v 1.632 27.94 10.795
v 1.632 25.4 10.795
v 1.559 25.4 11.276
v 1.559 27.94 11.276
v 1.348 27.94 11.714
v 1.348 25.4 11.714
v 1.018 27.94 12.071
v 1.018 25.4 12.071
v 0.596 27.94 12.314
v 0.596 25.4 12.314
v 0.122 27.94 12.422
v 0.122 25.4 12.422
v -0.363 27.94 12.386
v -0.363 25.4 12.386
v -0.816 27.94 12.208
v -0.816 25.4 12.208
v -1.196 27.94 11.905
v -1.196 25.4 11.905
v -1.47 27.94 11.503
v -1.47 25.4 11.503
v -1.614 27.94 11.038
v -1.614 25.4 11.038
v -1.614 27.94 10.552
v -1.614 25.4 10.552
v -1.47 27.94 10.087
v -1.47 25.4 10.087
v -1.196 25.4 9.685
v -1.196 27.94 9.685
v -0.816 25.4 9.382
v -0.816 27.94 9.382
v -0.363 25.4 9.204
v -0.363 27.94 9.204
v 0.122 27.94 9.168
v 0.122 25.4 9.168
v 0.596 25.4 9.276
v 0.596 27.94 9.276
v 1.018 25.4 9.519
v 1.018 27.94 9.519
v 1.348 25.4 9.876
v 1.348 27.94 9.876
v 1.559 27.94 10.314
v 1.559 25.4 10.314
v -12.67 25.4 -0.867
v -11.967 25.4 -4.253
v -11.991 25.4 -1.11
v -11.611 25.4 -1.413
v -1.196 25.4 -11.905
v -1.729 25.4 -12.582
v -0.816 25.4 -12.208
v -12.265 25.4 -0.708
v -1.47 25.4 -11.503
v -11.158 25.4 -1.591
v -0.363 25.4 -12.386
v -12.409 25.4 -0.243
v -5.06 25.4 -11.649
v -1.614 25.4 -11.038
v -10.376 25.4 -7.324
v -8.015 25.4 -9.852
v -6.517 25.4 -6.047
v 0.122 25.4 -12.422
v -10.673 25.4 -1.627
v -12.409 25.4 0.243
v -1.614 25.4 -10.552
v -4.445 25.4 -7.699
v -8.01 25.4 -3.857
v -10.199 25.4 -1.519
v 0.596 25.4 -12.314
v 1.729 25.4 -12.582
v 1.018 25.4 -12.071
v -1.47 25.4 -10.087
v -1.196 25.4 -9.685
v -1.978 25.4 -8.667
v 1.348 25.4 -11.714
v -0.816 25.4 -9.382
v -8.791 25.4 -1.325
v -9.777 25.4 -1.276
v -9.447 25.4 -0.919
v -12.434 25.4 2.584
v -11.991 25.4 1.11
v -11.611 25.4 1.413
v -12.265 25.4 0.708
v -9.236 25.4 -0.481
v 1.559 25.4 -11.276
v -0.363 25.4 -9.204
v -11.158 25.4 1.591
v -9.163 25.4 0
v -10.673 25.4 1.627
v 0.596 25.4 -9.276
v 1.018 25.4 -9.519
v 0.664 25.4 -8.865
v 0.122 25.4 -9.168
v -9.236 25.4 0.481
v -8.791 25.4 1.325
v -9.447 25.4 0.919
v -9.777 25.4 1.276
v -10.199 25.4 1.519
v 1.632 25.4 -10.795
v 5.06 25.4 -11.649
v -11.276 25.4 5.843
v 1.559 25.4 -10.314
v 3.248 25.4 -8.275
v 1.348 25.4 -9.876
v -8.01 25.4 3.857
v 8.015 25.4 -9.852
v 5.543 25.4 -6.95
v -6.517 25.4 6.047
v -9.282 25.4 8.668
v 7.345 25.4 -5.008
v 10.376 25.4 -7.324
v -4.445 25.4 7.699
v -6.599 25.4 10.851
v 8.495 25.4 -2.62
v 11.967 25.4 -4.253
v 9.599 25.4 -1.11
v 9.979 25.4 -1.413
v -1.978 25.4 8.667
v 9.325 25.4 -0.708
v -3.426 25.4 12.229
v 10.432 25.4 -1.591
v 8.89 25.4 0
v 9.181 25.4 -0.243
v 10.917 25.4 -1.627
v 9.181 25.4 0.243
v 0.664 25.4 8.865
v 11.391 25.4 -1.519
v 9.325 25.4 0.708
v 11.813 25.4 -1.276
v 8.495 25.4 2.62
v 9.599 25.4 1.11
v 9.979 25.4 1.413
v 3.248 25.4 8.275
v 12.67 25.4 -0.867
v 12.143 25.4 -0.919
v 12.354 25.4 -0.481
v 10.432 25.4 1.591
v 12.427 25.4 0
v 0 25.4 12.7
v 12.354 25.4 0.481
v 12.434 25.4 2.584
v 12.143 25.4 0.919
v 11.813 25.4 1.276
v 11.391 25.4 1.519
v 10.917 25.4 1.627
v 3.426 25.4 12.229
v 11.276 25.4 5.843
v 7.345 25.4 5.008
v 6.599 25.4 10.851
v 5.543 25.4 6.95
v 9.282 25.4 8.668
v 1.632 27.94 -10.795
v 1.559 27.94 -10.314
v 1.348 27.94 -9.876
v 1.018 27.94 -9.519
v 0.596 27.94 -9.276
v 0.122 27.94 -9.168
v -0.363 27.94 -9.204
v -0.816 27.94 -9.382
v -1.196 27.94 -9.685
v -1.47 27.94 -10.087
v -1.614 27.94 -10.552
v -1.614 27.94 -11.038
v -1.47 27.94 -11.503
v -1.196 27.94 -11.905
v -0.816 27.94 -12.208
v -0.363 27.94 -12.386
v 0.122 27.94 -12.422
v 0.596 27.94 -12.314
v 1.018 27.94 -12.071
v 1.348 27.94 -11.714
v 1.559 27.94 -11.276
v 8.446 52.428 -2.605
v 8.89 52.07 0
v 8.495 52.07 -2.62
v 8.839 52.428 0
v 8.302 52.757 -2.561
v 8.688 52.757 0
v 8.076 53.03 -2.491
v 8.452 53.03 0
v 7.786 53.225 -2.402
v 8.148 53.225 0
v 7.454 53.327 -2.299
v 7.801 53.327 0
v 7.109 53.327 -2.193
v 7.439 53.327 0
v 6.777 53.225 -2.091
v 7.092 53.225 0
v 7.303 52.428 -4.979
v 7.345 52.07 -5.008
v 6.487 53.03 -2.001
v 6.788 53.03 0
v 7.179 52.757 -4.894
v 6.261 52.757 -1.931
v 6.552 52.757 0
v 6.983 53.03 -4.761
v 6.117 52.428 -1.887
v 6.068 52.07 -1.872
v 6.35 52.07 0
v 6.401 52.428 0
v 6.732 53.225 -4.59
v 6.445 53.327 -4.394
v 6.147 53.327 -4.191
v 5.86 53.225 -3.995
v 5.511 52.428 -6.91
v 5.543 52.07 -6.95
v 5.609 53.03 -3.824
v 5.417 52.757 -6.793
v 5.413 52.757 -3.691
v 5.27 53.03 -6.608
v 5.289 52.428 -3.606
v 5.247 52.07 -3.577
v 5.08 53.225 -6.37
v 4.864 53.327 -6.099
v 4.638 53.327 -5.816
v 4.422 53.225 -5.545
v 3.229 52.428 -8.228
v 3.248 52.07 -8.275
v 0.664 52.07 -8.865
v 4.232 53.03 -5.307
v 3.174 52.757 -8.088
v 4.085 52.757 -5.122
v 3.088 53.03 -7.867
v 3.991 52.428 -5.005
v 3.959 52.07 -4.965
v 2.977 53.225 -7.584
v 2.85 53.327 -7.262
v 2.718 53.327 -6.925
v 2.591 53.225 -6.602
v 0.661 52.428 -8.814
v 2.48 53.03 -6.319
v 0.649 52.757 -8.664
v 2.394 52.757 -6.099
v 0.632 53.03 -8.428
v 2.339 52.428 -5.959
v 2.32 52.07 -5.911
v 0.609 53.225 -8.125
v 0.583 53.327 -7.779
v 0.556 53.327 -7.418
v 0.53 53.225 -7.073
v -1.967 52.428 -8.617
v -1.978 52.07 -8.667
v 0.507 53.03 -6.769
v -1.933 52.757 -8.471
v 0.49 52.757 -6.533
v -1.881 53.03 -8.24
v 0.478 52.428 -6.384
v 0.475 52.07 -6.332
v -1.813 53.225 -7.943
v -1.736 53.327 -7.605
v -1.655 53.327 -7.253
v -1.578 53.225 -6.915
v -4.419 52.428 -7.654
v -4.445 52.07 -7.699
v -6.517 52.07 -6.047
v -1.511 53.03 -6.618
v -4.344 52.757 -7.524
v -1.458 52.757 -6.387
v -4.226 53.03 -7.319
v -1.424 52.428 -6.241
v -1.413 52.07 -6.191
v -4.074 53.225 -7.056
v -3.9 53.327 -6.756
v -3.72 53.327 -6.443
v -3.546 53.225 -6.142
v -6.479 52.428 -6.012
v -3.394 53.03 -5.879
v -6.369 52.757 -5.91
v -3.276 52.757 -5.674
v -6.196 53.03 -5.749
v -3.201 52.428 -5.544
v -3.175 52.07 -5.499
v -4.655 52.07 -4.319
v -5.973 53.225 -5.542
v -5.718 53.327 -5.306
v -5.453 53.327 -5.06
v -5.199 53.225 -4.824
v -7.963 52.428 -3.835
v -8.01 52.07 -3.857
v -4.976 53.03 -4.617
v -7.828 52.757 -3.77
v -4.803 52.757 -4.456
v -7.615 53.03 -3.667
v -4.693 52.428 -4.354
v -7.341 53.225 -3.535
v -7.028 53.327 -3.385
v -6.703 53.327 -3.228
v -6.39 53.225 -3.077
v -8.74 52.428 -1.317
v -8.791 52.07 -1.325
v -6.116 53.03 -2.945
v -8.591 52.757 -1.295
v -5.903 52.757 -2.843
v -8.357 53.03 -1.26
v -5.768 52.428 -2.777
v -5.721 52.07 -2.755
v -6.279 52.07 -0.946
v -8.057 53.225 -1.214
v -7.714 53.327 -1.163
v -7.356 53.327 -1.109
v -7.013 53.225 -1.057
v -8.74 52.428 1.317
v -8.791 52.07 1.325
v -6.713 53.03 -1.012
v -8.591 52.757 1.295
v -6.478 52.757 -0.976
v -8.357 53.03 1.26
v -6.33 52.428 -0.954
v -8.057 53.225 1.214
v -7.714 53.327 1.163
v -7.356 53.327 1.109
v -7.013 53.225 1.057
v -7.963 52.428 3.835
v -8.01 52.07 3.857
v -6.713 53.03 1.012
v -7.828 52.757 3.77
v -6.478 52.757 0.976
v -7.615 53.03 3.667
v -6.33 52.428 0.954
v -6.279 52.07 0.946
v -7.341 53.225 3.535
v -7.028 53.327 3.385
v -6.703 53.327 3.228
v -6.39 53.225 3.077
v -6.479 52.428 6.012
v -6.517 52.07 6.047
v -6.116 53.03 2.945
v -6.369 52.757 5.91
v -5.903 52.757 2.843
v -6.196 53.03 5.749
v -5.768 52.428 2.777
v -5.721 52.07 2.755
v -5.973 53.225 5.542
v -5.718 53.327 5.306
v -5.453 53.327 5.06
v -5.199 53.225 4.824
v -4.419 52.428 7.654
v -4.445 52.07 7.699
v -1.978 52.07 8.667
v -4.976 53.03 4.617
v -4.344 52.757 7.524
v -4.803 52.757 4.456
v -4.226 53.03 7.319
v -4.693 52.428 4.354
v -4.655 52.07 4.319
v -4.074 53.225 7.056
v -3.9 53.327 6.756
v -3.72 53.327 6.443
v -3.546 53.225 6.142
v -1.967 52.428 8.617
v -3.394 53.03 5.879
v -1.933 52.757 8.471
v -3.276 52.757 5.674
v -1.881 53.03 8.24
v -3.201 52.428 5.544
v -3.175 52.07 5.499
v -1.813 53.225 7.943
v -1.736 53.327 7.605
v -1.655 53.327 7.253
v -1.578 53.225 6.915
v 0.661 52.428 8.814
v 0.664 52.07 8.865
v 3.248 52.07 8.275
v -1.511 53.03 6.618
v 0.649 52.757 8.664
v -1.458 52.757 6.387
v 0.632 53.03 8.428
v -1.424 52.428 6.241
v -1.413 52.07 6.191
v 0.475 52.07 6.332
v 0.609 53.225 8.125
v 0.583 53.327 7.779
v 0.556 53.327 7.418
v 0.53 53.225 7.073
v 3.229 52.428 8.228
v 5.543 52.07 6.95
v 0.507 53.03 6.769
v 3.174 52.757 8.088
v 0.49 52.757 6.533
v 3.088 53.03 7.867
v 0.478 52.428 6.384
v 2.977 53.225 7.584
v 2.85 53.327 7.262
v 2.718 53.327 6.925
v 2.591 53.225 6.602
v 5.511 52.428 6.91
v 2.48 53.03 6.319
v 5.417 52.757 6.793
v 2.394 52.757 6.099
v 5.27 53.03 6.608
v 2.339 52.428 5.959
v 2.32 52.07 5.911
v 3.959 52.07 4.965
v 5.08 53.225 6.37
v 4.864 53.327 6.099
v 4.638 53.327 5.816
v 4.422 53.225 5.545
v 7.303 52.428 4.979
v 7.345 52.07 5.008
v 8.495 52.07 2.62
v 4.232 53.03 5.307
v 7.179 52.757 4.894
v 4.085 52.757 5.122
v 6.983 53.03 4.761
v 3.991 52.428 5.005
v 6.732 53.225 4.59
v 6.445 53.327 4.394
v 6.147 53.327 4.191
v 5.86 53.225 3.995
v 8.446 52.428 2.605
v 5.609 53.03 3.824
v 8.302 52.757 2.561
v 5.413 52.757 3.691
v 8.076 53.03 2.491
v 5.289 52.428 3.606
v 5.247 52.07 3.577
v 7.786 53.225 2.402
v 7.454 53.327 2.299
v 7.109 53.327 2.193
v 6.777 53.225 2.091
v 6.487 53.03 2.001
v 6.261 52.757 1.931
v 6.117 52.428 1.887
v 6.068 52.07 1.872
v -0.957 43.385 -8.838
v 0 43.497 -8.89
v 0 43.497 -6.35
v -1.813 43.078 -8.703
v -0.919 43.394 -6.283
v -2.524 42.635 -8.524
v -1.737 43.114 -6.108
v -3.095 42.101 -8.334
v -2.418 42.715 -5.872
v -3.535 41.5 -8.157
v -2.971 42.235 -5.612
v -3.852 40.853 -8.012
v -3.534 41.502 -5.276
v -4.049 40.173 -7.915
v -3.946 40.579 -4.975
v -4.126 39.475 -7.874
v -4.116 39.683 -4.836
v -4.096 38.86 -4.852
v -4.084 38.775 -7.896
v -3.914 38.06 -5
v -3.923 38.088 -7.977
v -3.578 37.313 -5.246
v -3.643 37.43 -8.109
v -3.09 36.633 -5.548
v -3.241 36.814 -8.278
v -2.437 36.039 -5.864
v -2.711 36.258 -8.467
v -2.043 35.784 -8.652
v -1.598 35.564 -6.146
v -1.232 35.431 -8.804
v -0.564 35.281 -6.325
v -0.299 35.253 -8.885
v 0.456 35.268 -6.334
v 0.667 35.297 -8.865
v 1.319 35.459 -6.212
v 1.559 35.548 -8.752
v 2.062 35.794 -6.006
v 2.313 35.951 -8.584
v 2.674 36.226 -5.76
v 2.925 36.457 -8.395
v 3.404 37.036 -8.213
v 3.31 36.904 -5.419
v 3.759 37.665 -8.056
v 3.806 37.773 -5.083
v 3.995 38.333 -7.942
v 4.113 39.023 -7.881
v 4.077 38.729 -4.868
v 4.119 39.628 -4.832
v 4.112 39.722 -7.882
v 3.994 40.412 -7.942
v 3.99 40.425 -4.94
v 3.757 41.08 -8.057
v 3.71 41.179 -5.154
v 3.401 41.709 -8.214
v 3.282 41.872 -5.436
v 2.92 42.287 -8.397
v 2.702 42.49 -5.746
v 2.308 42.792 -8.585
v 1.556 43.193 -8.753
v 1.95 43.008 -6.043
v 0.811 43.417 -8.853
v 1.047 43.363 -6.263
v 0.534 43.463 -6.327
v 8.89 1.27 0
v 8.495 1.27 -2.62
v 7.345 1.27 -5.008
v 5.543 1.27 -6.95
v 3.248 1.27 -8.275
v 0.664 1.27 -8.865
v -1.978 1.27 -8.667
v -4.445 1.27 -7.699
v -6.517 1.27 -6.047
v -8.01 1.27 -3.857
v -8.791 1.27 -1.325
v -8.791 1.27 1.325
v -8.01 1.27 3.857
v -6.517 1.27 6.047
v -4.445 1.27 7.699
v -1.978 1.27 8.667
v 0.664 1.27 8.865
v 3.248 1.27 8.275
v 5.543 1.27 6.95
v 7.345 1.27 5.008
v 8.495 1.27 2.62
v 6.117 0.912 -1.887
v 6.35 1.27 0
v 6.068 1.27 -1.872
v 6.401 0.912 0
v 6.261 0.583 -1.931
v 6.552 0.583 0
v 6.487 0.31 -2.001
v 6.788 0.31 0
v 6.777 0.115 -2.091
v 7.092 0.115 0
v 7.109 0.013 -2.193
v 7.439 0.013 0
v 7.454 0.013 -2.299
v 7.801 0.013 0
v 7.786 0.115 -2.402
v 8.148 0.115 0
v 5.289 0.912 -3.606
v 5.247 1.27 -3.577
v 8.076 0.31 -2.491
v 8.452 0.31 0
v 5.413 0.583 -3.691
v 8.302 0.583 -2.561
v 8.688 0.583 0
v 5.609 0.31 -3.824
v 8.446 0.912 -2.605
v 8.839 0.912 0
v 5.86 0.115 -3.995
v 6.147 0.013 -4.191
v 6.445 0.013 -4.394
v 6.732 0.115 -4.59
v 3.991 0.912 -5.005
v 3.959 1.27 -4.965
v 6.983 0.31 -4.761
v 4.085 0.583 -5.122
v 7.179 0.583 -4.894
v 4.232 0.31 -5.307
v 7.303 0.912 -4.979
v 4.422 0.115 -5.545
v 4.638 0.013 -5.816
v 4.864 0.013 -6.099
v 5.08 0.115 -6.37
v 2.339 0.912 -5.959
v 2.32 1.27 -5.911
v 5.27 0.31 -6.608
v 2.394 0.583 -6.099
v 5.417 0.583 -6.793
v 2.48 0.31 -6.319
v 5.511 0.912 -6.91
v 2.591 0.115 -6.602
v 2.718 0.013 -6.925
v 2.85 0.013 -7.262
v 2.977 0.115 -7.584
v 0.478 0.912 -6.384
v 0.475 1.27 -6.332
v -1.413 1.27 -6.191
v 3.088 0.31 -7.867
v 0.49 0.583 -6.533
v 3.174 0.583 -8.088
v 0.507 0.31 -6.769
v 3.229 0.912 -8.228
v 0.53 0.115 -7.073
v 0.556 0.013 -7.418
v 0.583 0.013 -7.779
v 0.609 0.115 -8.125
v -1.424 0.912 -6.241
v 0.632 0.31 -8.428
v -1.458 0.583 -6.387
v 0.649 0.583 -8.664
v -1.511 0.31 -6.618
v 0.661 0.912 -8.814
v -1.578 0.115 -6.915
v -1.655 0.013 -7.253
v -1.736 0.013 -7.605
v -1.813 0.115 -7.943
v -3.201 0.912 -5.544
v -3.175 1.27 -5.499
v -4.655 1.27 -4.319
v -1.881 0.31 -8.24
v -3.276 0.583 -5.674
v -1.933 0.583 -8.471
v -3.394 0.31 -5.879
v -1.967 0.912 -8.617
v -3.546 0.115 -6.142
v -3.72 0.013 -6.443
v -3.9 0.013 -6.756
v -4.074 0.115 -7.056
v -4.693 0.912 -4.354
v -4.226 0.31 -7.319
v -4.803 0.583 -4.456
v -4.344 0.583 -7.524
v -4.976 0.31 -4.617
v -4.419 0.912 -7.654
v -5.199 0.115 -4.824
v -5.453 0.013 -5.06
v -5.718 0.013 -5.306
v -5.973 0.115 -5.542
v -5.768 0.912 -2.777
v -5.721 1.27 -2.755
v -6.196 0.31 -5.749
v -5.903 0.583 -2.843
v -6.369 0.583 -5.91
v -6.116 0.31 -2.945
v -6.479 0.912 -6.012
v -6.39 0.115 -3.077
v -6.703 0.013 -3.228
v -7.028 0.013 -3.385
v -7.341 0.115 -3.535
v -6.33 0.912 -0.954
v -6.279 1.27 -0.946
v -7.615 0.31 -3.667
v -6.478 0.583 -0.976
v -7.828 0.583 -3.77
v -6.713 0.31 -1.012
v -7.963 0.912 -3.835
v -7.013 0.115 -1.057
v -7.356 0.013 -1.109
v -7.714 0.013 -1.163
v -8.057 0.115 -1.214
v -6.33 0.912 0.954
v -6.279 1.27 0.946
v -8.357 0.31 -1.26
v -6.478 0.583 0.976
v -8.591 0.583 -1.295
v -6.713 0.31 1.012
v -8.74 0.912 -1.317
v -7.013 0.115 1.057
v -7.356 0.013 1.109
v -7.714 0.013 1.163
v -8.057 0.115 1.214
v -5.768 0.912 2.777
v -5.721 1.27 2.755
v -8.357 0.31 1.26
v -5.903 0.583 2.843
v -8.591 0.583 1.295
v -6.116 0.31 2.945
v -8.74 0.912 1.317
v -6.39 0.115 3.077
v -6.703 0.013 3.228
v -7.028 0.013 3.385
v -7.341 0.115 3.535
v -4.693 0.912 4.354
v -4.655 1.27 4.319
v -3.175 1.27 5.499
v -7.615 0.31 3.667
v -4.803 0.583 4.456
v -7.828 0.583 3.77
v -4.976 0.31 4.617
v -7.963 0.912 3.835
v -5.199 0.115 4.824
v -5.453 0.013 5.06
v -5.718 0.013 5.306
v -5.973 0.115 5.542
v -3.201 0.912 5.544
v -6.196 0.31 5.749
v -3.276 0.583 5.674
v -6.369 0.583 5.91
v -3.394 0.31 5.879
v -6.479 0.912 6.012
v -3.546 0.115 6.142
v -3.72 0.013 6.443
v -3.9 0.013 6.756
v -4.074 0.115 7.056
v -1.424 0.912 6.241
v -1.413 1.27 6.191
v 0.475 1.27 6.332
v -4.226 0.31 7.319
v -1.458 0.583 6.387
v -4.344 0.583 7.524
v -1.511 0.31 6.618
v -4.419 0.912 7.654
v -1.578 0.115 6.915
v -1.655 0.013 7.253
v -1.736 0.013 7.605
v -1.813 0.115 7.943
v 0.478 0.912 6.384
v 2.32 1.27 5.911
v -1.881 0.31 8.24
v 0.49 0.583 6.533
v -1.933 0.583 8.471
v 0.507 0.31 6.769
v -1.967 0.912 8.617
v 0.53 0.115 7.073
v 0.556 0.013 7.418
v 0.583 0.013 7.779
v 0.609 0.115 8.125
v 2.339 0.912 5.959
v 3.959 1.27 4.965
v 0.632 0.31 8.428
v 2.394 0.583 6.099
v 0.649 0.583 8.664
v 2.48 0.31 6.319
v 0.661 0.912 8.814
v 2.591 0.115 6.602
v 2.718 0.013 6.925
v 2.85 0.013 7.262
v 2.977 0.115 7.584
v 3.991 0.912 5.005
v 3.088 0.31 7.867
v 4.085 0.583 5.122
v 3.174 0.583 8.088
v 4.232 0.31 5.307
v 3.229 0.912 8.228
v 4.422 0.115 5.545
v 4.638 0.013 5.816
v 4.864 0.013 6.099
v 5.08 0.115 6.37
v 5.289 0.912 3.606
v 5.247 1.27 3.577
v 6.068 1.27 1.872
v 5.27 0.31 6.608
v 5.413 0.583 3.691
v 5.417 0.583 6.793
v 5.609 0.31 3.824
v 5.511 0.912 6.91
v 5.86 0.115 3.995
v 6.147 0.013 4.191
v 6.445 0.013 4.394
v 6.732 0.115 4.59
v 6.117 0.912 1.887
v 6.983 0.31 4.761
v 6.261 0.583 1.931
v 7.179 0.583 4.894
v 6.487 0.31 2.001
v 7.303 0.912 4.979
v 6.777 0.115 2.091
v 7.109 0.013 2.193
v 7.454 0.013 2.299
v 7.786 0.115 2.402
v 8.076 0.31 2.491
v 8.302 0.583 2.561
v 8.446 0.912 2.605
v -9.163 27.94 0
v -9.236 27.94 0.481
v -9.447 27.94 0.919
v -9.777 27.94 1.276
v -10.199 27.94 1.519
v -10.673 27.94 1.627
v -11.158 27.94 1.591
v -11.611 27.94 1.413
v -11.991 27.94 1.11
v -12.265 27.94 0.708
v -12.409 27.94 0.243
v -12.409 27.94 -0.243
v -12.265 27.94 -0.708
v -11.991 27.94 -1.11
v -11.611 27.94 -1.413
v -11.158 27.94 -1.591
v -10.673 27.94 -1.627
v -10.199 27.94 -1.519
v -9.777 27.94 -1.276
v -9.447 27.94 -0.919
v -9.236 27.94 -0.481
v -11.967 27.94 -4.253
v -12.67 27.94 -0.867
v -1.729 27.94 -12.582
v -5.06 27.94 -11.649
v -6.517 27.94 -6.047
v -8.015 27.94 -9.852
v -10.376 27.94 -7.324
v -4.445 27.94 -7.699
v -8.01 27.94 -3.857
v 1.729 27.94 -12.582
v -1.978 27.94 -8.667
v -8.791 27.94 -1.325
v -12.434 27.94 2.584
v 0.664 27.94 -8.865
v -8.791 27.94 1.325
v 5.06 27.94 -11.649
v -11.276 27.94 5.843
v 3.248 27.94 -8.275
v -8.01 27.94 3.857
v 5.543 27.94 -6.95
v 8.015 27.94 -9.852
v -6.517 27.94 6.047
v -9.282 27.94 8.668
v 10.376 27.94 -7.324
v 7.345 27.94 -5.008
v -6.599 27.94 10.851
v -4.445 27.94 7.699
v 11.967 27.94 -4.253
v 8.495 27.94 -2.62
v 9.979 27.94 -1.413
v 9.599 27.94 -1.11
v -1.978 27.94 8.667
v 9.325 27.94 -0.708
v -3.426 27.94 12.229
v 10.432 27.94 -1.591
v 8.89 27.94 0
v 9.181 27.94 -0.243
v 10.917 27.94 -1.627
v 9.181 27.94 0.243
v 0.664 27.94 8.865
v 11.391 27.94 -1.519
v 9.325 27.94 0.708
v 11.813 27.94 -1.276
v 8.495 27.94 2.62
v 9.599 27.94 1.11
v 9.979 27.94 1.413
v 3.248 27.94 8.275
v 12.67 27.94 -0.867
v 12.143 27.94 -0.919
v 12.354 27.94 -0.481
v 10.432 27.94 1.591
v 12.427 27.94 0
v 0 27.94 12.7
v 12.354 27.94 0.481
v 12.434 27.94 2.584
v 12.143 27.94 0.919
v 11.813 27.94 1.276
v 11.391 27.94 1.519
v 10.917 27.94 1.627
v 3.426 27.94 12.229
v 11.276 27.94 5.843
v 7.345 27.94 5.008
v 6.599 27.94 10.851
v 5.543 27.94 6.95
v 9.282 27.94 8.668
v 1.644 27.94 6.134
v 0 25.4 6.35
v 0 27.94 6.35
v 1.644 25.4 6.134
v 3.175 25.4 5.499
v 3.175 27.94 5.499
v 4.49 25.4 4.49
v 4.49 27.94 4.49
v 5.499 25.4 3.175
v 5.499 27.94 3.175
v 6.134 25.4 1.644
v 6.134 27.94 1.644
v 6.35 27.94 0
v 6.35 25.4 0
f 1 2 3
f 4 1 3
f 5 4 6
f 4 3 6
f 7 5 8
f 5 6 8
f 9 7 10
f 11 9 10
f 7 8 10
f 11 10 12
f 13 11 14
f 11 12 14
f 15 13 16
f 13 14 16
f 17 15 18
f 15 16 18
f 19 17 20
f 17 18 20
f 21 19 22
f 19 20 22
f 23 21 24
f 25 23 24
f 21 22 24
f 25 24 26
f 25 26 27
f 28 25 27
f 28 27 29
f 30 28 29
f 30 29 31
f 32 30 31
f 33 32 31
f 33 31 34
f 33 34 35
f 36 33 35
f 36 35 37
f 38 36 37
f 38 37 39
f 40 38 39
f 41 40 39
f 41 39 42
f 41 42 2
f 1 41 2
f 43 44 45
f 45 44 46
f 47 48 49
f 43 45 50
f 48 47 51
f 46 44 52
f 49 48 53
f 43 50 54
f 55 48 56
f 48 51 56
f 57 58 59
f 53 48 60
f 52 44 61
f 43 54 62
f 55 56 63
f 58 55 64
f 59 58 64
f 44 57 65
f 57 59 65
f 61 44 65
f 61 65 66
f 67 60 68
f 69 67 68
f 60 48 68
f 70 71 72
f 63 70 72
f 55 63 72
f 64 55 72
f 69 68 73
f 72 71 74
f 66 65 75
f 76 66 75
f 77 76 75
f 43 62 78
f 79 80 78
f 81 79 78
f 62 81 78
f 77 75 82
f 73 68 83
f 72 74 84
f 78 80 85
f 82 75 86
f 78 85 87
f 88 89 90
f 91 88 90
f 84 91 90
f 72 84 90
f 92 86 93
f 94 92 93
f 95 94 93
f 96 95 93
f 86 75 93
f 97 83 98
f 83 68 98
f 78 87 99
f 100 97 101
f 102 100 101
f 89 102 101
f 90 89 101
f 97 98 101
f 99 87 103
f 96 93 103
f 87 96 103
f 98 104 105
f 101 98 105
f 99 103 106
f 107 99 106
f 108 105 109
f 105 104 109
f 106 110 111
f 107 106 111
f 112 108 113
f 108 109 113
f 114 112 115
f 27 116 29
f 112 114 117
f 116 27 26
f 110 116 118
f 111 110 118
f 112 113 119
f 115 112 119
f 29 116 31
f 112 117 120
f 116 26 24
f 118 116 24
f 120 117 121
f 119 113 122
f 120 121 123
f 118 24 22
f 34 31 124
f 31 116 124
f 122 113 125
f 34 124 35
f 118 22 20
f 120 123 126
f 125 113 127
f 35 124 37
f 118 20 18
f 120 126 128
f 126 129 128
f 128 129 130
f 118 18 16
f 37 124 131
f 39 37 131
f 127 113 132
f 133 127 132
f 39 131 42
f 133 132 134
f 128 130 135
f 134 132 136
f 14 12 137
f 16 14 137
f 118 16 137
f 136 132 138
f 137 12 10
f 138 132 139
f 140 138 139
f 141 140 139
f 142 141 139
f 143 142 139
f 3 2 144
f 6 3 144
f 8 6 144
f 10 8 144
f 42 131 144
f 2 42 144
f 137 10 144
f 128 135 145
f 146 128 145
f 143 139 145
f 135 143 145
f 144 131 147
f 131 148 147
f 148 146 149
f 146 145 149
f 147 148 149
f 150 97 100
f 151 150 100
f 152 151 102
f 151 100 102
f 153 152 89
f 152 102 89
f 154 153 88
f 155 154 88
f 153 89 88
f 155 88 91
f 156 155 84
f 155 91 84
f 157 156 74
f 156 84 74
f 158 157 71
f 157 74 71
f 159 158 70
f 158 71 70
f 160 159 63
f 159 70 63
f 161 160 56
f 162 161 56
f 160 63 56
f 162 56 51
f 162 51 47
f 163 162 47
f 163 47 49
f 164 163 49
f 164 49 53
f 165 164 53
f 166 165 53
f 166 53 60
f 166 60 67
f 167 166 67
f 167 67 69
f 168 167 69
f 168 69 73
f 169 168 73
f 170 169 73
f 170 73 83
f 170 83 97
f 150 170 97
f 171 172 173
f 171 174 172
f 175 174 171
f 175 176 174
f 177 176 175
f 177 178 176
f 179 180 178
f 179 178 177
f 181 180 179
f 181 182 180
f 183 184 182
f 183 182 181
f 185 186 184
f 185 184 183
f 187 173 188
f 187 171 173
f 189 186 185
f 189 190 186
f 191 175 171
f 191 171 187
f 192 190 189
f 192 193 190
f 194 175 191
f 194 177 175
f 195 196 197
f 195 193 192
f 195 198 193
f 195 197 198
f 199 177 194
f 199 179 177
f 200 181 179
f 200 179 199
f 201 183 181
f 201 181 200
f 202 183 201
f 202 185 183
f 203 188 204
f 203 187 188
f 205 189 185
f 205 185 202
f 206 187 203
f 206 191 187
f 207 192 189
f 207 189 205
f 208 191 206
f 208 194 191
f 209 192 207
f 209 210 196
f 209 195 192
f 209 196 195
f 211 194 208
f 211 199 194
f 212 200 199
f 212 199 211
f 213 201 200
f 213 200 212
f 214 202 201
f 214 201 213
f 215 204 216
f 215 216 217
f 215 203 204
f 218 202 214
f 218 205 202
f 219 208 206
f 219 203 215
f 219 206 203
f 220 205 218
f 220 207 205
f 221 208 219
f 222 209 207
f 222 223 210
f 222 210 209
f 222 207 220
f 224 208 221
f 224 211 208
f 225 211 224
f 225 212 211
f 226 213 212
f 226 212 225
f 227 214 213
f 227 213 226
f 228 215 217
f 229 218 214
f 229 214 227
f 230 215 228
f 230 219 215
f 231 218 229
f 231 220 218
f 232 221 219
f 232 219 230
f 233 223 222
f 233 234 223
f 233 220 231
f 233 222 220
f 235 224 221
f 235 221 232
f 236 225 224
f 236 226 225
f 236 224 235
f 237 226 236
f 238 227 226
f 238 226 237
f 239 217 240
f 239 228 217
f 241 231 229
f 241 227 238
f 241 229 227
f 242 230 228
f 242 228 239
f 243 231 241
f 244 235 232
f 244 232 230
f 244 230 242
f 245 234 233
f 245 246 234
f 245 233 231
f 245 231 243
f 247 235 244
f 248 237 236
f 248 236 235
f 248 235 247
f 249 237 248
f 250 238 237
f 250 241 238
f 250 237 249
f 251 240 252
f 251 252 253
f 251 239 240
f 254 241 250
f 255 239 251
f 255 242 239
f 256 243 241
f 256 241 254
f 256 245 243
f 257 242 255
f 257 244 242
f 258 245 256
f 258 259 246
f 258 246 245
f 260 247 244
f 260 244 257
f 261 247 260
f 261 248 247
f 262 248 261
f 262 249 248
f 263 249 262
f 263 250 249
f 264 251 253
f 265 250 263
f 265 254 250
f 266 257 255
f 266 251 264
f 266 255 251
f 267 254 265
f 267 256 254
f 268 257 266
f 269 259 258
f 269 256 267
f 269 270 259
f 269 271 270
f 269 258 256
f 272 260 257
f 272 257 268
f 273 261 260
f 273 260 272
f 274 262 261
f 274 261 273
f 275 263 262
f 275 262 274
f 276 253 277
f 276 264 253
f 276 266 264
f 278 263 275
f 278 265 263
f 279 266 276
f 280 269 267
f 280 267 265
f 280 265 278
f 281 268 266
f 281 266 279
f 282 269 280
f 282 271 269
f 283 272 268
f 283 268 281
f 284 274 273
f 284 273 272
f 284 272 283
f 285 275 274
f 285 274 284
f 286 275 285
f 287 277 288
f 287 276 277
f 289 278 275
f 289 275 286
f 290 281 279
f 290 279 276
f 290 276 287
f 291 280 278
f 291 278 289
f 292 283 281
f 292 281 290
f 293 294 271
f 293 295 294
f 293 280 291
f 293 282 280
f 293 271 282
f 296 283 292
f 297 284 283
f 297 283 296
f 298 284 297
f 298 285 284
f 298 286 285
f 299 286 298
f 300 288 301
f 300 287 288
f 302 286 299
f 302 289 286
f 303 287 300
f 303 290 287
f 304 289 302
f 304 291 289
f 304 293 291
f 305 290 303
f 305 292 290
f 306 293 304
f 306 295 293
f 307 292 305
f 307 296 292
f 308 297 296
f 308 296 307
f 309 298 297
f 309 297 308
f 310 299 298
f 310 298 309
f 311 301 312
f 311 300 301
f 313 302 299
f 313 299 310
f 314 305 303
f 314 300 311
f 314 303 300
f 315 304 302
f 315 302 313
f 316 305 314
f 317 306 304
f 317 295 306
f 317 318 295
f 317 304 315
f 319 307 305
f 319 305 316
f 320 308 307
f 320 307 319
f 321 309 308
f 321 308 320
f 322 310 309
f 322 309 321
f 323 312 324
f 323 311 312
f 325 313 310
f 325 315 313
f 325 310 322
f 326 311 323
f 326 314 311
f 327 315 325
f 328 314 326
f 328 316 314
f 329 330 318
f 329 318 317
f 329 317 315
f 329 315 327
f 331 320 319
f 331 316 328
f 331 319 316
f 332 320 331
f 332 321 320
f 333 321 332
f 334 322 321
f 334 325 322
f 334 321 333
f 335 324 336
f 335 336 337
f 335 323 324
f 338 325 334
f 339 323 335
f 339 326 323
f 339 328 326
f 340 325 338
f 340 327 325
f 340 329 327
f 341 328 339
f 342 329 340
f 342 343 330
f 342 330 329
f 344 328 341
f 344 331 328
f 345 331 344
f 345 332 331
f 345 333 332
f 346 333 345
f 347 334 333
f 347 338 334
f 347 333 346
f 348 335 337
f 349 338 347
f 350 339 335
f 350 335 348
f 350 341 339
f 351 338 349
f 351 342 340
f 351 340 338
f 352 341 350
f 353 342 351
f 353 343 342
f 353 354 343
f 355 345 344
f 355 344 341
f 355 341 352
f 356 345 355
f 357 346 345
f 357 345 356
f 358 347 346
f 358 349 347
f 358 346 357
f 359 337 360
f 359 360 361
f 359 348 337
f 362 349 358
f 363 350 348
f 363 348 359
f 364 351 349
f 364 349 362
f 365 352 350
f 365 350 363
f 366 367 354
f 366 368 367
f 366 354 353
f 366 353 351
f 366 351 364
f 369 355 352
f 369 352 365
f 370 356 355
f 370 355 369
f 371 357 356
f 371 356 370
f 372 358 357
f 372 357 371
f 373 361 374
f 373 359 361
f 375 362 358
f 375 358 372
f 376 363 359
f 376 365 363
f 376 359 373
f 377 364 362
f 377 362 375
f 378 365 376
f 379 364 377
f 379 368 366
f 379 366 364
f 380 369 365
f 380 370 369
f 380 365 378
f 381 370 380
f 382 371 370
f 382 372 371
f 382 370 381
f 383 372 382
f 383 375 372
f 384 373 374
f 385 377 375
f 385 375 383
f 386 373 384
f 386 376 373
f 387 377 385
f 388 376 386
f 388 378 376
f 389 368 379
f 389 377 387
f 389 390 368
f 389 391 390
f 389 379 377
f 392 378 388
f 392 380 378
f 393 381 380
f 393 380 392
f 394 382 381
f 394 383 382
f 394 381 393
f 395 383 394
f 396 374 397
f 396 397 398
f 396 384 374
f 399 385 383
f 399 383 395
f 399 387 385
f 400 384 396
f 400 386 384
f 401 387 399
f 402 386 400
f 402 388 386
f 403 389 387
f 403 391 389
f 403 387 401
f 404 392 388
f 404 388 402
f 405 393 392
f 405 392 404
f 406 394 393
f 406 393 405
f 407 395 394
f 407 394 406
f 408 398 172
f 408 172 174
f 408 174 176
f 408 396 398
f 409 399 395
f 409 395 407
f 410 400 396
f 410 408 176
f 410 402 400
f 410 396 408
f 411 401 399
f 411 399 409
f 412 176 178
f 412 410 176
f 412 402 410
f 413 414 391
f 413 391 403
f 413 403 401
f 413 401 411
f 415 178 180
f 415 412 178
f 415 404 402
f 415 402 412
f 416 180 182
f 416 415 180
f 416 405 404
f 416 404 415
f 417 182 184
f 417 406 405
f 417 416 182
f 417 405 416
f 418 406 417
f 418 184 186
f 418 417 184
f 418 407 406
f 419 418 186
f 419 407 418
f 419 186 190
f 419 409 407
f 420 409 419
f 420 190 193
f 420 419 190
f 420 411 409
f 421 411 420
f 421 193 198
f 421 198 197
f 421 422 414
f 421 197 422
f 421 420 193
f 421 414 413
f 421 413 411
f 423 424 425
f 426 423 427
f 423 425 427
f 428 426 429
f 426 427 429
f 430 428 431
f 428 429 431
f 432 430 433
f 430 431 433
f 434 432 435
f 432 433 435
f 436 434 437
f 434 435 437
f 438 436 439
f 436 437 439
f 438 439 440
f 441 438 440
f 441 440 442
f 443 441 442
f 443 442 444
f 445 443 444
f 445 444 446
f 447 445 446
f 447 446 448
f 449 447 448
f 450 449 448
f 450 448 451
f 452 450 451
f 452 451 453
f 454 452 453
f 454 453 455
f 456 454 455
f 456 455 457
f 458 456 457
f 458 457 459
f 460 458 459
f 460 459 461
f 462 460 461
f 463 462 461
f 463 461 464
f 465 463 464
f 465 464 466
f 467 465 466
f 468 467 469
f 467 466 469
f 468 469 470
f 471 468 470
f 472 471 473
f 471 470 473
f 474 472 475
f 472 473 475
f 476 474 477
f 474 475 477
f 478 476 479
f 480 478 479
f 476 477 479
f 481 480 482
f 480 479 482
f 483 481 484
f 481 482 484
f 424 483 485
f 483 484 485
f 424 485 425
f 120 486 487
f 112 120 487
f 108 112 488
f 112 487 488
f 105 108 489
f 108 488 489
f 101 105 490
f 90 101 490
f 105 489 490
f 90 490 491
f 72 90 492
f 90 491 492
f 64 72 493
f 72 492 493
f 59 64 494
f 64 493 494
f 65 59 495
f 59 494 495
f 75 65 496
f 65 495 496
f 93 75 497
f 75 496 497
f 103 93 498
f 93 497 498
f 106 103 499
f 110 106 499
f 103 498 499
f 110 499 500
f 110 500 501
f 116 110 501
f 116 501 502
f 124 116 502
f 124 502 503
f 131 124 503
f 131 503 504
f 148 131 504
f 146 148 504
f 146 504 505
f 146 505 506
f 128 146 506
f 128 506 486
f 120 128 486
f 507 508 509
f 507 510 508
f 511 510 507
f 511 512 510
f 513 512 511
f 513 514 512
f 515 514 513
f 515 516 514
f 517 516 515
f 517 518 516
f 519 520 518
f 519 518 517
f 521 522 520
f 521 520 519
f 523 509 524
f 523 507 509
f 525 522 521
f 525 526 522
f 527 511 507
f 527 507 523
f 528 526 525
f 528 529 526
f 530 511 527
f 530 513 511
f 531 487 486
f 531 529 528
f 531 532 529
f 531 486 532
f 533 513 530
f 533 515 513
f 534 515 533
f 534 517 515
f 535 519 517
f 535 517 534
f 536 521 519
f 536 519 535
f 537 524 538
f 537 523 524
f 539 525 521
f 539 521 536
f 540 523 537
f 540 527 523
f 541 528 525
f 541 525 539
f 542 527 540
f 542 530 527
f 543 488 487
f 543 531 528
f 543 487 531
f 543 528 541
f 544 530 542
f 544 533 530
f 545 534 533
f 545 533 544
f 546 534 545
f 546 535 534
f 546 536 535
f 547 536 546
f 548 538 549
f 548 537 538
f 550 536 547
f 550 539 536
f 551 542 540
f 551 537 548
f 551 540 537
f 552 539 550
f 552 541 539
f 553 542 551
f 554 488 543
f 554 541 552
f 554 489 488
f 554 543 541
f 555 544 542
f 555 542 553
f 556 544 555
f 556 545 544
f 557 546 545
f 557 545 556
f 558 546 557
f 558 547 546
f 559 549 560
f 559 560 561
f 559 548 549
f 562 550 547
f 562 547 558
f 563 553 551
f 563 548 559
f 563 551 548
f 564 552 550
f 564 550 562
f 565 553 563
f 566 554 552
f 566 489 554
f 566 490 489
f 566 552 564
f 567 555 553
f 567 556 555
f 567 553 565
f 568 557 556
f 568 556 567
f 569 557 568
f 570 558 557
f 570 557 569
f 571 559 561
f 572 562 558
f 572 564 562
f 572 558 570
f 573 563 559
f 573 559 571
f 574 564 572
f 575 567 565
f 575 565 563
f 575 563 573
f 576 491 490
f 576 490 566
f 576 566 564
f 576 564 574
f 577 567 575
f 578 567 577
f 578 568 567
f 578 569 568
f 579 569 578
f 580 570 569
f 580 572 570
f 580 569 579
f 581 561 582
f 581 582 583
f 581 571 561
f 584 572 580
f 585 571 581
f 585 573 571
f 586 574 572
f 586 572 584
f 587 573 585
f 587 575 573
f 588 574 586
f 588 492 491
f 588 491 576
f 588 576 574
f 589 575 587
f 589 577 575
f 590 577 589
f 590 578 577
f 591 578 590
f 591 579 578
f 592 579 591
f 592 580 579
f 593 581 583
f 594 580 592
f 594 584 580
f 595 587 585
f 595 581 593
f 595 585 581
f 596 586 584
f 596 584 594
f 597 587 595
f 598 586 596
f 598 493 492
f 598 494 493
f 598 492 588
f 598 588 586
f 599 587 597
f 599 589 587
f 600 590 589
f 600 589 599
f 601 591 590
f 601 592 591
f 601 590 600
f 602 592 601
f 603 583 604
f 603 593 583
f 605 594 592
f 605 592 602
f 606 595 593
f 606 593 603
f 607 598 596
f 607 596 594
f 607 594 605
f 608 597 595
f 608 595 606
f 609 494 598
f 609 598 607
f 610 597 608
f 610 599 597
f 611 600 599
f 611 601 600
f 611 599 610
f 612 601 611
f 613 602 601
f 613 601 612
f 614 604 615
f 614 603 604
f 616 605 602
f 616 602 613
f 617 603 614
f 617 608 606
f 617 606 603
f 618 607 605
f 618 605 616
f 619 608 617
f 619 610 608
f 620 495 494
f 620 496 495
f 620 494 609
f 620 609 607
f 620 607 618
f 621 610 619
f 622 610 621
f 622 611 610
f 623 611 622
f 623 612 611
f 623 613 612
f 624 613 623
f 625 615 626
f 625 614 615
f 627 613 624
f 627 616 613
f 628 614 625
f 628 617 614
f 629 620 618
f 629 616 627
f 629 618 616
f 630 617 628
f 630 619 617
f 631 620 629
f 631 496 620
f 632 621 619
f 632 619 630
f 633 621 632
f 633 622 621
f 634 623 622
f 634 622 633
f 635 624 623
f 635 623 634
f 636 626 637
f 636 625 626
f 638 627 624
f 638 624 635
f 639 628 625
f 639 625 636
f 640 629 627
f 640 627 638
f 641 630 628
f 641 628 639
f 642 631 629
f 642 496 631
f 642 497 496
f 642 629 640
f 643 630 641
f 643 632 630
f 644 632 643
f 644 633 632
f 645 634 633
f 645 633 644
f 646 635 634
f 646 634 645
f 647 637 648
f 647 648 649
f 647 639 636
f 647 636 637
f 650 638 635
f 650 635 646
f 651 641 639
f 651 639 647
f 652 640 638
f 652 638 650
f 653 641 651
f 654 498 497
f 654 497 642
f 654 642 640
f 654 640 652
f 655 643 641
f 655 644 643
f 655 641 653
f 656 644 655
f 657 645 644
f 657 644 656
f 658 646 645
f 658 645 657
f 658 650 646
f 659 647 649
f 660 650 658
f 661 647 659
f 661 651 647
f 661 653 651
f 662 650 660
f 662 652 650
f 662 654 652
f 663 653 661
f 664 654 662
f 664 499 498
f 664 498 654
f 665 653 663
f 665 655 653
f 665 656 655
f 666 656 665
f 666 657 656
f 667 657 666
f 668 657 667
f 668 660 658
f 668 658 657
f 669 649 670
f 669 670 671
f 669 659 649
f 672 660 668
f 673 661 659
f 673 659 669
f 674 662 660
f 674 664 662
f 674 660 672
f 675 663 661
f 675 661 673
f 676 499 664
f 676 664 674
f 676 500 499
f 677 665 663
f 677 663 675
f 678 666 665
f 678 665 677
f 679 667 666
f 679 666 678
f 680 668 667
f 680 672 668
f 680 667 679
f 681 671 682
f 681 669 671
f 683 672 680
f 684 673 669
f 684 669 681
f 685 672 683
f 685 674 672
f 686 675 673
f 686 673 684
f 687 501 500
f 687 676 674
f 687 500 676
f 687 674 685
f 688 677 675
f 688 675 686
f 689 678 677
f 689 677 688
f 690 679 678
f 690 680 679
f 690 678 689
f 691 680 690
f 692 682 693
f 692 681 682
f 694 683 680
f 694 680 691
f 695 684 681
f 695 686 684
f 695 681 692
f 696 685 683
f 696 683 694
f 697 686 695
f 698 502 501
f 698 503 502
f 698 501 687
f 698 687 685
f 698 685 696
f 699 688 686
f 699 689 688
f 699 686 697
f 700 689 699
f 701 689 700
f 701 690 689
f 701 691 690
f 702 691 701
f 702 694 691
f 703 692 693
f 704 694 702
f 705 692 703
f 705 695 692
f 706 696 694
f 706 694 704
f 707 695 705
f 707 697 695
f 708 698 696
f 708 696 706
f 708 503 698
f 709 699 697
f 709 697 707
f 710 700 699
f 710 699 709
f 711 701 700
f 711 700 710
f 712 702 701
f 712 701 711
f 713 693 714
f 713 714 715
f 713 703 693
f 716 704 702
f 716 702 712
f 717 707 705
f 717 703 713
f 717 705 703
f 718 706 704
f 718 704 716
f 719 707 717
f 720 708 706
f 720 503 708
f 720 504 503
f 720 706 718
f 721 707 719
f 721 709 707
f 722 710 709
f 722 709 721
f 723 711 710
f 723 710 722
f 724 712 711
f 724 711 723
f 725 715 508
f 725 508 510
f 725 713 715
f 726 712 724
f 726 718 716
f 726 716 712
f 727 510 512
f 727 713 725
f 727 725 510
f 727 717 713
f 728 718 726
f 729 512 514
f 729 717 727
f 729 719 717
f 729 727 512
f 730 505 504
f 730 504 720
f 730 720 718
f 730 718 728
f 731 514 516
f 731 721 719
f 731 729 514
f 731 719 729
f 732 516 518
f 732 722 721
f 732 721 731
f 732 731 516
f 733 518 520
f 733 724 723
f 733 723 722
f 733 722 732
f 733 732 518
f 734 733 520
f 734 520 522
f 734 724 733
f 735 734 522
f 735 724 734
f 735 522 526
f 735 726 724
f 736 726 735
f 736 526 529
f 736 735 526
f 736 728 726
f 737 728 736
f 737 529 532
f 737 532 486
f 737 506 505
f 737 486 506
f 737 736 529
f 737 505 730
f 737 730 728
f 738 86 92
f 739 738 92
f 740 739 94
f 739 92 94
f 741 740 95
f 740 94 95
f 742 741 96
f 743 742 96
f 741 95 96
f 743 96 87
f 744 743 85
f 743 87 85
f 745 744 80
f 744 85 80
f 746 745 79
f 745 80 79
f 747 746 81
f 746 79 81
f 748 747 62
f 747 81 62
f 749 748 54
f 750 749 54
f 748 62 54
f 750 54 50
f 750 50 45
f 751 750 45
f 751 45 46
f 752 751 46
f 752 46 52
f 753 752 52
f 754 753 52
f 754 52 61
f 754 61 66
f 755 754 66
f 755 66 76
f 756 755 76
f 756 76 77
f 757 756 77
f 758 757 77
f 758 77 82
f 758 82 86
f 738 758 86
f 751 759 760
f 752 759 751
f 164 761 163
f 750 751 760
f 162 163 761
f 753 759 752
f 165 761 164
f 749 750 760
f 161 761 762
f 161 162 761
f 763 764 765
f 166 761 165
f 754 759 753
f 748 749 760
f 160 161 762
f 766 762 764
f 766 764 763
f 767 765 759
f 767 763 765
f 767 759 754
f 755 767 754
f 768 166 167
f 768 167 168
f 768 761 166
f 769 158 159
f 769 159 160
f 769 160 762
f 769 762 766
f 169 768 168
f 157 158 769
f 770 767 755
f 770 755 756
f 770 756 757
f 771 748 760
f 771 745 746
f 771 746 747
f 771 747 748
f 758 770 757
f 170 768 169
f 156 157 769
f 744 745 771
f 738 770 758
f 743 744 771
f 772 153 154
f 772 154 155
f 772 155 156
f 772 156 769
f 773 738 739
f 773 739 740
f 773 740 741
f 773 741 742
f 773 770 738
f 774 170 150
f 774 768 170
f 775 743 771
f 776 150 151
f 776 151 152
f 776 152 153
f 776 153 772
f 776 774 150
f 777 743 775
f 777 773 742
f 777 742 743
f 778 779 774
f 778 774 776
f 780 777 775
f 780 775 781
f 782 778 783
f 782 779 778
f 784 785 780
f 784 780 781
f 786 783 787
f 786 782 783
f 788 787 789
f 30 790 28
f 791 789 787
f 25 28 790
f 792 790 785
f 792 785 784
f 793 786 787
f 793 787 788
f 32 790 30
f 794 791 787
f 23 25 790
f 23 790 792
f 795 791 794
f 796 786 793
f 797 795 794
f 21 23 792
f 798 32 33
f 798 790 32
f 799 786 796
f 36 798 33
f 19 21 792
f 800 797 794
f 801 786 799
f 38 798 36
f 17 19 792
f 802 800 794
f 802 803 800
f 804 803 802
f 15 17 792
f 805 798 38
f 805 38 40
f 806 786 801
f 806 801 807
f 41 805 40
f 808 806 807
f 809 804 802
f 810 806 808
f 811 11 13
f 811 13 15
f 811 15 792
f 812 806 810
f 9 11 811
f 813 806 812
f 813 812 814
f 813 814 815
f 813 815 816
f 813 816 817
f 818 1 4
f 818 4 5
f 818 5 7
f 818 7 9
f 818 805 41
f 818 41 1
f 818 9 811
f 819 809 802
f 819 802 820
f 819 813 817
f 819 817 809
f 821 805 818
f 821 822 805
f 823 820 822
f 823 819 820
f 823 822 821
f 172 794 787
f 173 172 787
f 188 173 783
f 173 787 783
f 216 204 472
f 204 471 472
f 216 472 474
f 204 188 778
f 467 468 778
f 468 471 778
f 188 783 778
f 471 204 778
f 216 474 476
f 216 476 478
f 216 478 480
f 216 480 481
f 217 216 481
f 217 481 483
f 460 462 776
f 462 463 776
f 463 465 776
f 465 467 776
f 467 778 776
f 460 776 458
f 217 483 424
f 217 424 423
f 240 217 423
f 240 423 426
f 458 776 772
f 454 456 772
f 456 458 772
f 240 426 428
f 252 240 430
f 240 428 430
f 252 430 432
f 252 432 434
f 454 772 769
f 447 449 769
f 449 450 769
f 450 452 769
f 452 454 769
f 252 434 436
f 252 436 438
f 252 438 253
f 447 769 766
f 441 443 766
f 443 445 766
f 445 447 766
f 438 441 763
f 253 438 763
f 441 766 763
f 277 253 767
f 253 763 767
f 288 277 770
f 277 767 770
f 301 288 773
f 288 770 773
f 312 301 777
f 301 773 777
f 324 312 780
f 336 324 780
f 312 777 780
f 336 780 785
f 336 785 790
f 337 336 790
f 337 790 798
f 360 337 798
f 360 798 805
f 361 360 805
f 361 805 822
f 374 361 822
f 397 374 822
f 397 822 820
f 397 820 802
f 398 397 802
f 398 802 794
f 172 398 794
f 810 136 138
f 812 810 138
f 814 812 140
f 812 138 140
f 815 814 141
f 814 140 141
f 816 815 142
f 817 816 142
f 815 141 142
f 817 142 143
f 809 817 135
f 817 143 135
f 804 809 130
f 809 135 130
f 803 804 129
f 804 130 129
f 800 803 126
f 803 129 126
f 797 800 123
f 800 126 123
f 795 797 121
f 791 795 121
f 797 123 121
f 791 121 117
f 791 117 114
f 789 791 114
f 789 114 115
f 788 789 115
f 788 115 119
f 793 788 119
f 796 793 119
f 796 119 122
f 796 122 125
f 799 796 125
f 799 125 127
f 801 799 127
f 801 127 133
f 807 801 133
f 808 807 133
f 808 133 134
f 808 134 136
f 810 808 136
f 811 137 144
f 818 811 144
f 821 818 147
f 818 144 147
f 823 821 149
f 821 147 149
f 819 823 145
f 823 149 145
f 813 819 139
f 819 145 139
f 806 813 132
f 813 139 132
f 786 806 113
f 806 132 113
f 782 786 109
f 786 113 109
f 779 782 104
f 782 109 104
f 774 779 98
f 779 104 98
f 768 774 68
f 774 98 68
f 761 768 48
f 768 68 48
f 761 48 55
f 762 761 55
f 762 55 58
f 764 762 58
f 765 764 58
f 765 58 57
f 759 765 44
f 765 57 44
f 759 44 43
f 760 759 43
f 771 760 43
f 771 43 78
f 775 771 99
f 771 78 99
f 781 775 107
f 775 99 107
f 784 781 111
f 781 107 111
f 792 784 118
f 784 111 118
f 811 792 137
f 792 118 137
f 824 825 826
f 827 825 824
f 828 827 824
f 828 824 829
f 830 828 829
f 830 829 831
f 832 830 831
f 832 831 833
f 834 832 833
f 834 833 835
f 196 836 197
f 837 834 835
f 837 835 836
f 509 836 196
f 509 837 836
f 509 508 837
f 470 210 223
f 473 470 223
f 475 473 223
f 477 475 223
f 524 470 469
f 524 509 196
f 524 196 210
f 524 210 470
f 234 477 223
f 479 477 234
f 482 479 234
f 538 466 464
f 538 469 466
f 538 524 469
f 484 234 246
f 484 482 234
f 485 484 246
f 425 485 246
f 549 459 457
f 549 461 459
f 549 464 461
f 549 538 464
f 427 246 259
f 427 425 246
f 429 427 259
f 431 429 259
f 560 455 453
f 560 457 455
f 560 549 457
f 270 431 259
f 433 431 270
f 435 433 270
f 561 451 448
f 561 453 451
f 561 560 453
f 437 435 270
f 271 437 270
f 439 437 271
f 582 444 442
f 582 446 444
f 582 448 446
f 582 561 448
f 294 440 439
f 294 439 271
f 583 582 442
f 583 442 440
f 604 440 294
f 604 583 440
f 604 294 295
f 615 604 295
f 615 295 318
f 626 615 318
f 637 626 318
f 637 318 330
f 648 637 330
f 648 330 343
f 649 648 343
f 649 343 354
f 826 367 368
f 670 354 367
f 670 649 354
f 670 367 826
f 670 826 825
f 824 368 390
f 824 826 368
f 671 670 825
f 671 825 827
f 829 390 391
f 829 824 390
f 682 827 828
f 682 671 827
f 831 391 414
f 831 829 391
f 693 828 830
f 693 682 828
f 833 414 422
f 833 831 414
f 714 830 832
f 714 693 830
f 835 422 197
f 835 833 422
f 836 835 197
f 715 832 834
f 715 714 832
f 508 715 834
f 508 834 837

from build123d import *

# Parameters (mm, degrees)
SKETCH1_R                 = 8.89
SKETCH1_R_2               = 6.35
EXTRUDE_THIN1_DEPTH       = 25.4
SKETCH2_R                 = 12.7
SKETCH2_R_2               = 6.35
BOSS_EXTRUDE1_DEPTH       = 2.54
SKETCH3_R                 = 8.89
SKETCH3_R_2               = 6.35
EXTRUDE_THIN2_DEPTH       = 25.4
SKETCH4_R                 = 4.1275
CUT_EXTRUDE1_DEPTH        = 25.4
F_4_CLEARANCE_HOLE1_D     = 3.2639
F_4_CLEARANCE_HOLE1_DEPTH = 25.4
F_4_CLEARANCE_HOLE1_TIP   = 0.980574487
FILLET2_R                 = 1.27
FILLET3_R                 = 1.27


with BuildPart() as part:
    # Sketch1 → Extrude-Thin1 (new body)
    with BuildSketch(Plane(origin=(0, 0, 0), x_dir=(1, 0, 0), z_dir=(0, 1, 0))):
        Circle(SKETCH1_R)
        Circle(SKETCH1_R_2, mode=Mode.SUBTRACT)
    extrude(amount=EXTRUDE_THIN1_DEPTH)

    # Sketch2 → Boss-Extrude1 (add)
    with BuildSketch(Plane(origin=(0, 25.4, 0), x_dir=(1, 0, 0), z_dir=(0, 1, 0))):
        with Locations(Location((0, 0, 0), (0, 0, 270))):
            Circle(SKETCH2_R)
        with Locations(Location((0, 0, 0), (0, 0, 270))):
            Circle(SKETCH2_R_2, mode=Mode.SUBTRACT)
    extrude(amount=BOSS_EXTRUDE1_DEPTH)

    # Sketch3 → Extrude-Thin2 (add)
    with BuildSketch(Plane(origin=(0, 27.94, 0), x_dir=(1, 0, 0), z_dir=(0, 1, 0))):
        Circle(SKETCH3_R)
        Circle(SKETCH3_R_2, mode=Mode.SUBTRACT)
    extrude(amount=EXTRUDE_THIN2_DEPTH)

    # Sketch4 → Cut-Extrude1 (cut)
    with BuildSketch(Plane.XY):
        with Locations(Location((0, 39.37, 0), (0, 0, 90))):
            Circle(SKETCH4_R)
    extrude(amount=-CUT_EXTRUDE1_DEPTH, mode=Mode.SUBTRACT)

    # #4 Clearance Hole1
    with Locations(Plane(origin=(0, 27.94, 0), x_dir=(-1, 0, 0), z_dir=(0, 1, 0))):
        with Locations((-10.795, 0), (0, -10.795), (0, 10.795), (10.795, 0)):
            Hole(F_4_CLEARANCE_HOLE1_D / 2, depth=F_4_CLEARANCE_HOLE1_DEPTH)
            with Locations((0, 0, -(F_4_CLEARANCE_HOLE1_DEPTH + F_4_CLEARANCE_HOLE1_TIP / 2))):  # 118° drill point
                Cone(0, F_4_CLEARANCE_HOLE1_D / 2, F_4_CLEARANCE_HOLE1_TIP, mode=Mode.SUBTRACT)

    # Fillet2
    # the kernel refuses this fillet: 1.27 mm, written as the material it takes off along each edge
    with BuildSketch(Plane(origin=(0, 0, 0), x_dir=(1, 0, 0), z_dir=(0, 0, 1))) as fillet2_piece_1:
        with BuildLine():
            CenterArc((8.89 - FILLET2_R, FILLET2_R), FILLET2_R, 270, 90)
            Line((8.89 - FILLET2_R, 0), (8.89, 0))
            Line((8.89, 0), (8.89, FILLET2_R))
        make_face()
    revolve(axis=Axis((0, 0, 0), (0, 1, 0)), mode=Mode.SUBTRACT)
    with BuildSketch(Plane(origin=(0, 0, 0), x_dir=(1, 0, 0), z_dir=(0, 0, 1))) as fillet2_piece_2:
        with BuildLine():
            CenterArc((6.35 + FILLET2_R, FILLET2_R), FILLET2_R, 180, 90)
            Line((6.35, FILLET2_R), (6.35, 0))
            Line((6.35, 0), (6.35 + FILLET2_R, 0))
        make_face()
    revolve(axis=Axis((0, 0, 0), (0, 1, 0)), mode=Mode.SUBTRACT)

    # Fillet3
    # the kernel refuses this fillet: 1.27 mm, written as the material it takes off along each edge
    with BuildSketch(Plane(origin=(0, 53.34, 0), x_dir=(1, 0, 0), z_dir=(0, 0, 1))) as fillet3_piece_1:
        with BuildLine():
            CenterArc((8.89 - FILLET3_R, -FILLET3_R), FILLET3_R, 0, 90)
            Line((8.89 - FILLET3_R, 0), (8.89, 0))
            Line((8.89, 0), (8.89, -FILLET3_R))
        make_face()
    revolve(axis=Axis((0, 53.34, 0), (0, 1, 0)), mode=Mode.SUBTRACT)
    with BuildSketch(Plane(origin=(0, 53.34, 0), x_dir=(1, 0, 0), z_dir=(0, 0, 1))) as fillet3_piece_2:
        with BuildLine():
            CenterArc((6.35 + FILLET3_R, -FILLET3_R), FILLET3_R, 90, 90)
            Line((6.35 + FILLET3_R, 0), (6.35, 0))
            Line((6.35, 0), (6.35, -FILLET3_R))
        make_face()
    revolve(axis=Axis((0, 53.34, 0), (0, 1, 0)), mode=Mode.SUBTRACT)


solid = part.part
